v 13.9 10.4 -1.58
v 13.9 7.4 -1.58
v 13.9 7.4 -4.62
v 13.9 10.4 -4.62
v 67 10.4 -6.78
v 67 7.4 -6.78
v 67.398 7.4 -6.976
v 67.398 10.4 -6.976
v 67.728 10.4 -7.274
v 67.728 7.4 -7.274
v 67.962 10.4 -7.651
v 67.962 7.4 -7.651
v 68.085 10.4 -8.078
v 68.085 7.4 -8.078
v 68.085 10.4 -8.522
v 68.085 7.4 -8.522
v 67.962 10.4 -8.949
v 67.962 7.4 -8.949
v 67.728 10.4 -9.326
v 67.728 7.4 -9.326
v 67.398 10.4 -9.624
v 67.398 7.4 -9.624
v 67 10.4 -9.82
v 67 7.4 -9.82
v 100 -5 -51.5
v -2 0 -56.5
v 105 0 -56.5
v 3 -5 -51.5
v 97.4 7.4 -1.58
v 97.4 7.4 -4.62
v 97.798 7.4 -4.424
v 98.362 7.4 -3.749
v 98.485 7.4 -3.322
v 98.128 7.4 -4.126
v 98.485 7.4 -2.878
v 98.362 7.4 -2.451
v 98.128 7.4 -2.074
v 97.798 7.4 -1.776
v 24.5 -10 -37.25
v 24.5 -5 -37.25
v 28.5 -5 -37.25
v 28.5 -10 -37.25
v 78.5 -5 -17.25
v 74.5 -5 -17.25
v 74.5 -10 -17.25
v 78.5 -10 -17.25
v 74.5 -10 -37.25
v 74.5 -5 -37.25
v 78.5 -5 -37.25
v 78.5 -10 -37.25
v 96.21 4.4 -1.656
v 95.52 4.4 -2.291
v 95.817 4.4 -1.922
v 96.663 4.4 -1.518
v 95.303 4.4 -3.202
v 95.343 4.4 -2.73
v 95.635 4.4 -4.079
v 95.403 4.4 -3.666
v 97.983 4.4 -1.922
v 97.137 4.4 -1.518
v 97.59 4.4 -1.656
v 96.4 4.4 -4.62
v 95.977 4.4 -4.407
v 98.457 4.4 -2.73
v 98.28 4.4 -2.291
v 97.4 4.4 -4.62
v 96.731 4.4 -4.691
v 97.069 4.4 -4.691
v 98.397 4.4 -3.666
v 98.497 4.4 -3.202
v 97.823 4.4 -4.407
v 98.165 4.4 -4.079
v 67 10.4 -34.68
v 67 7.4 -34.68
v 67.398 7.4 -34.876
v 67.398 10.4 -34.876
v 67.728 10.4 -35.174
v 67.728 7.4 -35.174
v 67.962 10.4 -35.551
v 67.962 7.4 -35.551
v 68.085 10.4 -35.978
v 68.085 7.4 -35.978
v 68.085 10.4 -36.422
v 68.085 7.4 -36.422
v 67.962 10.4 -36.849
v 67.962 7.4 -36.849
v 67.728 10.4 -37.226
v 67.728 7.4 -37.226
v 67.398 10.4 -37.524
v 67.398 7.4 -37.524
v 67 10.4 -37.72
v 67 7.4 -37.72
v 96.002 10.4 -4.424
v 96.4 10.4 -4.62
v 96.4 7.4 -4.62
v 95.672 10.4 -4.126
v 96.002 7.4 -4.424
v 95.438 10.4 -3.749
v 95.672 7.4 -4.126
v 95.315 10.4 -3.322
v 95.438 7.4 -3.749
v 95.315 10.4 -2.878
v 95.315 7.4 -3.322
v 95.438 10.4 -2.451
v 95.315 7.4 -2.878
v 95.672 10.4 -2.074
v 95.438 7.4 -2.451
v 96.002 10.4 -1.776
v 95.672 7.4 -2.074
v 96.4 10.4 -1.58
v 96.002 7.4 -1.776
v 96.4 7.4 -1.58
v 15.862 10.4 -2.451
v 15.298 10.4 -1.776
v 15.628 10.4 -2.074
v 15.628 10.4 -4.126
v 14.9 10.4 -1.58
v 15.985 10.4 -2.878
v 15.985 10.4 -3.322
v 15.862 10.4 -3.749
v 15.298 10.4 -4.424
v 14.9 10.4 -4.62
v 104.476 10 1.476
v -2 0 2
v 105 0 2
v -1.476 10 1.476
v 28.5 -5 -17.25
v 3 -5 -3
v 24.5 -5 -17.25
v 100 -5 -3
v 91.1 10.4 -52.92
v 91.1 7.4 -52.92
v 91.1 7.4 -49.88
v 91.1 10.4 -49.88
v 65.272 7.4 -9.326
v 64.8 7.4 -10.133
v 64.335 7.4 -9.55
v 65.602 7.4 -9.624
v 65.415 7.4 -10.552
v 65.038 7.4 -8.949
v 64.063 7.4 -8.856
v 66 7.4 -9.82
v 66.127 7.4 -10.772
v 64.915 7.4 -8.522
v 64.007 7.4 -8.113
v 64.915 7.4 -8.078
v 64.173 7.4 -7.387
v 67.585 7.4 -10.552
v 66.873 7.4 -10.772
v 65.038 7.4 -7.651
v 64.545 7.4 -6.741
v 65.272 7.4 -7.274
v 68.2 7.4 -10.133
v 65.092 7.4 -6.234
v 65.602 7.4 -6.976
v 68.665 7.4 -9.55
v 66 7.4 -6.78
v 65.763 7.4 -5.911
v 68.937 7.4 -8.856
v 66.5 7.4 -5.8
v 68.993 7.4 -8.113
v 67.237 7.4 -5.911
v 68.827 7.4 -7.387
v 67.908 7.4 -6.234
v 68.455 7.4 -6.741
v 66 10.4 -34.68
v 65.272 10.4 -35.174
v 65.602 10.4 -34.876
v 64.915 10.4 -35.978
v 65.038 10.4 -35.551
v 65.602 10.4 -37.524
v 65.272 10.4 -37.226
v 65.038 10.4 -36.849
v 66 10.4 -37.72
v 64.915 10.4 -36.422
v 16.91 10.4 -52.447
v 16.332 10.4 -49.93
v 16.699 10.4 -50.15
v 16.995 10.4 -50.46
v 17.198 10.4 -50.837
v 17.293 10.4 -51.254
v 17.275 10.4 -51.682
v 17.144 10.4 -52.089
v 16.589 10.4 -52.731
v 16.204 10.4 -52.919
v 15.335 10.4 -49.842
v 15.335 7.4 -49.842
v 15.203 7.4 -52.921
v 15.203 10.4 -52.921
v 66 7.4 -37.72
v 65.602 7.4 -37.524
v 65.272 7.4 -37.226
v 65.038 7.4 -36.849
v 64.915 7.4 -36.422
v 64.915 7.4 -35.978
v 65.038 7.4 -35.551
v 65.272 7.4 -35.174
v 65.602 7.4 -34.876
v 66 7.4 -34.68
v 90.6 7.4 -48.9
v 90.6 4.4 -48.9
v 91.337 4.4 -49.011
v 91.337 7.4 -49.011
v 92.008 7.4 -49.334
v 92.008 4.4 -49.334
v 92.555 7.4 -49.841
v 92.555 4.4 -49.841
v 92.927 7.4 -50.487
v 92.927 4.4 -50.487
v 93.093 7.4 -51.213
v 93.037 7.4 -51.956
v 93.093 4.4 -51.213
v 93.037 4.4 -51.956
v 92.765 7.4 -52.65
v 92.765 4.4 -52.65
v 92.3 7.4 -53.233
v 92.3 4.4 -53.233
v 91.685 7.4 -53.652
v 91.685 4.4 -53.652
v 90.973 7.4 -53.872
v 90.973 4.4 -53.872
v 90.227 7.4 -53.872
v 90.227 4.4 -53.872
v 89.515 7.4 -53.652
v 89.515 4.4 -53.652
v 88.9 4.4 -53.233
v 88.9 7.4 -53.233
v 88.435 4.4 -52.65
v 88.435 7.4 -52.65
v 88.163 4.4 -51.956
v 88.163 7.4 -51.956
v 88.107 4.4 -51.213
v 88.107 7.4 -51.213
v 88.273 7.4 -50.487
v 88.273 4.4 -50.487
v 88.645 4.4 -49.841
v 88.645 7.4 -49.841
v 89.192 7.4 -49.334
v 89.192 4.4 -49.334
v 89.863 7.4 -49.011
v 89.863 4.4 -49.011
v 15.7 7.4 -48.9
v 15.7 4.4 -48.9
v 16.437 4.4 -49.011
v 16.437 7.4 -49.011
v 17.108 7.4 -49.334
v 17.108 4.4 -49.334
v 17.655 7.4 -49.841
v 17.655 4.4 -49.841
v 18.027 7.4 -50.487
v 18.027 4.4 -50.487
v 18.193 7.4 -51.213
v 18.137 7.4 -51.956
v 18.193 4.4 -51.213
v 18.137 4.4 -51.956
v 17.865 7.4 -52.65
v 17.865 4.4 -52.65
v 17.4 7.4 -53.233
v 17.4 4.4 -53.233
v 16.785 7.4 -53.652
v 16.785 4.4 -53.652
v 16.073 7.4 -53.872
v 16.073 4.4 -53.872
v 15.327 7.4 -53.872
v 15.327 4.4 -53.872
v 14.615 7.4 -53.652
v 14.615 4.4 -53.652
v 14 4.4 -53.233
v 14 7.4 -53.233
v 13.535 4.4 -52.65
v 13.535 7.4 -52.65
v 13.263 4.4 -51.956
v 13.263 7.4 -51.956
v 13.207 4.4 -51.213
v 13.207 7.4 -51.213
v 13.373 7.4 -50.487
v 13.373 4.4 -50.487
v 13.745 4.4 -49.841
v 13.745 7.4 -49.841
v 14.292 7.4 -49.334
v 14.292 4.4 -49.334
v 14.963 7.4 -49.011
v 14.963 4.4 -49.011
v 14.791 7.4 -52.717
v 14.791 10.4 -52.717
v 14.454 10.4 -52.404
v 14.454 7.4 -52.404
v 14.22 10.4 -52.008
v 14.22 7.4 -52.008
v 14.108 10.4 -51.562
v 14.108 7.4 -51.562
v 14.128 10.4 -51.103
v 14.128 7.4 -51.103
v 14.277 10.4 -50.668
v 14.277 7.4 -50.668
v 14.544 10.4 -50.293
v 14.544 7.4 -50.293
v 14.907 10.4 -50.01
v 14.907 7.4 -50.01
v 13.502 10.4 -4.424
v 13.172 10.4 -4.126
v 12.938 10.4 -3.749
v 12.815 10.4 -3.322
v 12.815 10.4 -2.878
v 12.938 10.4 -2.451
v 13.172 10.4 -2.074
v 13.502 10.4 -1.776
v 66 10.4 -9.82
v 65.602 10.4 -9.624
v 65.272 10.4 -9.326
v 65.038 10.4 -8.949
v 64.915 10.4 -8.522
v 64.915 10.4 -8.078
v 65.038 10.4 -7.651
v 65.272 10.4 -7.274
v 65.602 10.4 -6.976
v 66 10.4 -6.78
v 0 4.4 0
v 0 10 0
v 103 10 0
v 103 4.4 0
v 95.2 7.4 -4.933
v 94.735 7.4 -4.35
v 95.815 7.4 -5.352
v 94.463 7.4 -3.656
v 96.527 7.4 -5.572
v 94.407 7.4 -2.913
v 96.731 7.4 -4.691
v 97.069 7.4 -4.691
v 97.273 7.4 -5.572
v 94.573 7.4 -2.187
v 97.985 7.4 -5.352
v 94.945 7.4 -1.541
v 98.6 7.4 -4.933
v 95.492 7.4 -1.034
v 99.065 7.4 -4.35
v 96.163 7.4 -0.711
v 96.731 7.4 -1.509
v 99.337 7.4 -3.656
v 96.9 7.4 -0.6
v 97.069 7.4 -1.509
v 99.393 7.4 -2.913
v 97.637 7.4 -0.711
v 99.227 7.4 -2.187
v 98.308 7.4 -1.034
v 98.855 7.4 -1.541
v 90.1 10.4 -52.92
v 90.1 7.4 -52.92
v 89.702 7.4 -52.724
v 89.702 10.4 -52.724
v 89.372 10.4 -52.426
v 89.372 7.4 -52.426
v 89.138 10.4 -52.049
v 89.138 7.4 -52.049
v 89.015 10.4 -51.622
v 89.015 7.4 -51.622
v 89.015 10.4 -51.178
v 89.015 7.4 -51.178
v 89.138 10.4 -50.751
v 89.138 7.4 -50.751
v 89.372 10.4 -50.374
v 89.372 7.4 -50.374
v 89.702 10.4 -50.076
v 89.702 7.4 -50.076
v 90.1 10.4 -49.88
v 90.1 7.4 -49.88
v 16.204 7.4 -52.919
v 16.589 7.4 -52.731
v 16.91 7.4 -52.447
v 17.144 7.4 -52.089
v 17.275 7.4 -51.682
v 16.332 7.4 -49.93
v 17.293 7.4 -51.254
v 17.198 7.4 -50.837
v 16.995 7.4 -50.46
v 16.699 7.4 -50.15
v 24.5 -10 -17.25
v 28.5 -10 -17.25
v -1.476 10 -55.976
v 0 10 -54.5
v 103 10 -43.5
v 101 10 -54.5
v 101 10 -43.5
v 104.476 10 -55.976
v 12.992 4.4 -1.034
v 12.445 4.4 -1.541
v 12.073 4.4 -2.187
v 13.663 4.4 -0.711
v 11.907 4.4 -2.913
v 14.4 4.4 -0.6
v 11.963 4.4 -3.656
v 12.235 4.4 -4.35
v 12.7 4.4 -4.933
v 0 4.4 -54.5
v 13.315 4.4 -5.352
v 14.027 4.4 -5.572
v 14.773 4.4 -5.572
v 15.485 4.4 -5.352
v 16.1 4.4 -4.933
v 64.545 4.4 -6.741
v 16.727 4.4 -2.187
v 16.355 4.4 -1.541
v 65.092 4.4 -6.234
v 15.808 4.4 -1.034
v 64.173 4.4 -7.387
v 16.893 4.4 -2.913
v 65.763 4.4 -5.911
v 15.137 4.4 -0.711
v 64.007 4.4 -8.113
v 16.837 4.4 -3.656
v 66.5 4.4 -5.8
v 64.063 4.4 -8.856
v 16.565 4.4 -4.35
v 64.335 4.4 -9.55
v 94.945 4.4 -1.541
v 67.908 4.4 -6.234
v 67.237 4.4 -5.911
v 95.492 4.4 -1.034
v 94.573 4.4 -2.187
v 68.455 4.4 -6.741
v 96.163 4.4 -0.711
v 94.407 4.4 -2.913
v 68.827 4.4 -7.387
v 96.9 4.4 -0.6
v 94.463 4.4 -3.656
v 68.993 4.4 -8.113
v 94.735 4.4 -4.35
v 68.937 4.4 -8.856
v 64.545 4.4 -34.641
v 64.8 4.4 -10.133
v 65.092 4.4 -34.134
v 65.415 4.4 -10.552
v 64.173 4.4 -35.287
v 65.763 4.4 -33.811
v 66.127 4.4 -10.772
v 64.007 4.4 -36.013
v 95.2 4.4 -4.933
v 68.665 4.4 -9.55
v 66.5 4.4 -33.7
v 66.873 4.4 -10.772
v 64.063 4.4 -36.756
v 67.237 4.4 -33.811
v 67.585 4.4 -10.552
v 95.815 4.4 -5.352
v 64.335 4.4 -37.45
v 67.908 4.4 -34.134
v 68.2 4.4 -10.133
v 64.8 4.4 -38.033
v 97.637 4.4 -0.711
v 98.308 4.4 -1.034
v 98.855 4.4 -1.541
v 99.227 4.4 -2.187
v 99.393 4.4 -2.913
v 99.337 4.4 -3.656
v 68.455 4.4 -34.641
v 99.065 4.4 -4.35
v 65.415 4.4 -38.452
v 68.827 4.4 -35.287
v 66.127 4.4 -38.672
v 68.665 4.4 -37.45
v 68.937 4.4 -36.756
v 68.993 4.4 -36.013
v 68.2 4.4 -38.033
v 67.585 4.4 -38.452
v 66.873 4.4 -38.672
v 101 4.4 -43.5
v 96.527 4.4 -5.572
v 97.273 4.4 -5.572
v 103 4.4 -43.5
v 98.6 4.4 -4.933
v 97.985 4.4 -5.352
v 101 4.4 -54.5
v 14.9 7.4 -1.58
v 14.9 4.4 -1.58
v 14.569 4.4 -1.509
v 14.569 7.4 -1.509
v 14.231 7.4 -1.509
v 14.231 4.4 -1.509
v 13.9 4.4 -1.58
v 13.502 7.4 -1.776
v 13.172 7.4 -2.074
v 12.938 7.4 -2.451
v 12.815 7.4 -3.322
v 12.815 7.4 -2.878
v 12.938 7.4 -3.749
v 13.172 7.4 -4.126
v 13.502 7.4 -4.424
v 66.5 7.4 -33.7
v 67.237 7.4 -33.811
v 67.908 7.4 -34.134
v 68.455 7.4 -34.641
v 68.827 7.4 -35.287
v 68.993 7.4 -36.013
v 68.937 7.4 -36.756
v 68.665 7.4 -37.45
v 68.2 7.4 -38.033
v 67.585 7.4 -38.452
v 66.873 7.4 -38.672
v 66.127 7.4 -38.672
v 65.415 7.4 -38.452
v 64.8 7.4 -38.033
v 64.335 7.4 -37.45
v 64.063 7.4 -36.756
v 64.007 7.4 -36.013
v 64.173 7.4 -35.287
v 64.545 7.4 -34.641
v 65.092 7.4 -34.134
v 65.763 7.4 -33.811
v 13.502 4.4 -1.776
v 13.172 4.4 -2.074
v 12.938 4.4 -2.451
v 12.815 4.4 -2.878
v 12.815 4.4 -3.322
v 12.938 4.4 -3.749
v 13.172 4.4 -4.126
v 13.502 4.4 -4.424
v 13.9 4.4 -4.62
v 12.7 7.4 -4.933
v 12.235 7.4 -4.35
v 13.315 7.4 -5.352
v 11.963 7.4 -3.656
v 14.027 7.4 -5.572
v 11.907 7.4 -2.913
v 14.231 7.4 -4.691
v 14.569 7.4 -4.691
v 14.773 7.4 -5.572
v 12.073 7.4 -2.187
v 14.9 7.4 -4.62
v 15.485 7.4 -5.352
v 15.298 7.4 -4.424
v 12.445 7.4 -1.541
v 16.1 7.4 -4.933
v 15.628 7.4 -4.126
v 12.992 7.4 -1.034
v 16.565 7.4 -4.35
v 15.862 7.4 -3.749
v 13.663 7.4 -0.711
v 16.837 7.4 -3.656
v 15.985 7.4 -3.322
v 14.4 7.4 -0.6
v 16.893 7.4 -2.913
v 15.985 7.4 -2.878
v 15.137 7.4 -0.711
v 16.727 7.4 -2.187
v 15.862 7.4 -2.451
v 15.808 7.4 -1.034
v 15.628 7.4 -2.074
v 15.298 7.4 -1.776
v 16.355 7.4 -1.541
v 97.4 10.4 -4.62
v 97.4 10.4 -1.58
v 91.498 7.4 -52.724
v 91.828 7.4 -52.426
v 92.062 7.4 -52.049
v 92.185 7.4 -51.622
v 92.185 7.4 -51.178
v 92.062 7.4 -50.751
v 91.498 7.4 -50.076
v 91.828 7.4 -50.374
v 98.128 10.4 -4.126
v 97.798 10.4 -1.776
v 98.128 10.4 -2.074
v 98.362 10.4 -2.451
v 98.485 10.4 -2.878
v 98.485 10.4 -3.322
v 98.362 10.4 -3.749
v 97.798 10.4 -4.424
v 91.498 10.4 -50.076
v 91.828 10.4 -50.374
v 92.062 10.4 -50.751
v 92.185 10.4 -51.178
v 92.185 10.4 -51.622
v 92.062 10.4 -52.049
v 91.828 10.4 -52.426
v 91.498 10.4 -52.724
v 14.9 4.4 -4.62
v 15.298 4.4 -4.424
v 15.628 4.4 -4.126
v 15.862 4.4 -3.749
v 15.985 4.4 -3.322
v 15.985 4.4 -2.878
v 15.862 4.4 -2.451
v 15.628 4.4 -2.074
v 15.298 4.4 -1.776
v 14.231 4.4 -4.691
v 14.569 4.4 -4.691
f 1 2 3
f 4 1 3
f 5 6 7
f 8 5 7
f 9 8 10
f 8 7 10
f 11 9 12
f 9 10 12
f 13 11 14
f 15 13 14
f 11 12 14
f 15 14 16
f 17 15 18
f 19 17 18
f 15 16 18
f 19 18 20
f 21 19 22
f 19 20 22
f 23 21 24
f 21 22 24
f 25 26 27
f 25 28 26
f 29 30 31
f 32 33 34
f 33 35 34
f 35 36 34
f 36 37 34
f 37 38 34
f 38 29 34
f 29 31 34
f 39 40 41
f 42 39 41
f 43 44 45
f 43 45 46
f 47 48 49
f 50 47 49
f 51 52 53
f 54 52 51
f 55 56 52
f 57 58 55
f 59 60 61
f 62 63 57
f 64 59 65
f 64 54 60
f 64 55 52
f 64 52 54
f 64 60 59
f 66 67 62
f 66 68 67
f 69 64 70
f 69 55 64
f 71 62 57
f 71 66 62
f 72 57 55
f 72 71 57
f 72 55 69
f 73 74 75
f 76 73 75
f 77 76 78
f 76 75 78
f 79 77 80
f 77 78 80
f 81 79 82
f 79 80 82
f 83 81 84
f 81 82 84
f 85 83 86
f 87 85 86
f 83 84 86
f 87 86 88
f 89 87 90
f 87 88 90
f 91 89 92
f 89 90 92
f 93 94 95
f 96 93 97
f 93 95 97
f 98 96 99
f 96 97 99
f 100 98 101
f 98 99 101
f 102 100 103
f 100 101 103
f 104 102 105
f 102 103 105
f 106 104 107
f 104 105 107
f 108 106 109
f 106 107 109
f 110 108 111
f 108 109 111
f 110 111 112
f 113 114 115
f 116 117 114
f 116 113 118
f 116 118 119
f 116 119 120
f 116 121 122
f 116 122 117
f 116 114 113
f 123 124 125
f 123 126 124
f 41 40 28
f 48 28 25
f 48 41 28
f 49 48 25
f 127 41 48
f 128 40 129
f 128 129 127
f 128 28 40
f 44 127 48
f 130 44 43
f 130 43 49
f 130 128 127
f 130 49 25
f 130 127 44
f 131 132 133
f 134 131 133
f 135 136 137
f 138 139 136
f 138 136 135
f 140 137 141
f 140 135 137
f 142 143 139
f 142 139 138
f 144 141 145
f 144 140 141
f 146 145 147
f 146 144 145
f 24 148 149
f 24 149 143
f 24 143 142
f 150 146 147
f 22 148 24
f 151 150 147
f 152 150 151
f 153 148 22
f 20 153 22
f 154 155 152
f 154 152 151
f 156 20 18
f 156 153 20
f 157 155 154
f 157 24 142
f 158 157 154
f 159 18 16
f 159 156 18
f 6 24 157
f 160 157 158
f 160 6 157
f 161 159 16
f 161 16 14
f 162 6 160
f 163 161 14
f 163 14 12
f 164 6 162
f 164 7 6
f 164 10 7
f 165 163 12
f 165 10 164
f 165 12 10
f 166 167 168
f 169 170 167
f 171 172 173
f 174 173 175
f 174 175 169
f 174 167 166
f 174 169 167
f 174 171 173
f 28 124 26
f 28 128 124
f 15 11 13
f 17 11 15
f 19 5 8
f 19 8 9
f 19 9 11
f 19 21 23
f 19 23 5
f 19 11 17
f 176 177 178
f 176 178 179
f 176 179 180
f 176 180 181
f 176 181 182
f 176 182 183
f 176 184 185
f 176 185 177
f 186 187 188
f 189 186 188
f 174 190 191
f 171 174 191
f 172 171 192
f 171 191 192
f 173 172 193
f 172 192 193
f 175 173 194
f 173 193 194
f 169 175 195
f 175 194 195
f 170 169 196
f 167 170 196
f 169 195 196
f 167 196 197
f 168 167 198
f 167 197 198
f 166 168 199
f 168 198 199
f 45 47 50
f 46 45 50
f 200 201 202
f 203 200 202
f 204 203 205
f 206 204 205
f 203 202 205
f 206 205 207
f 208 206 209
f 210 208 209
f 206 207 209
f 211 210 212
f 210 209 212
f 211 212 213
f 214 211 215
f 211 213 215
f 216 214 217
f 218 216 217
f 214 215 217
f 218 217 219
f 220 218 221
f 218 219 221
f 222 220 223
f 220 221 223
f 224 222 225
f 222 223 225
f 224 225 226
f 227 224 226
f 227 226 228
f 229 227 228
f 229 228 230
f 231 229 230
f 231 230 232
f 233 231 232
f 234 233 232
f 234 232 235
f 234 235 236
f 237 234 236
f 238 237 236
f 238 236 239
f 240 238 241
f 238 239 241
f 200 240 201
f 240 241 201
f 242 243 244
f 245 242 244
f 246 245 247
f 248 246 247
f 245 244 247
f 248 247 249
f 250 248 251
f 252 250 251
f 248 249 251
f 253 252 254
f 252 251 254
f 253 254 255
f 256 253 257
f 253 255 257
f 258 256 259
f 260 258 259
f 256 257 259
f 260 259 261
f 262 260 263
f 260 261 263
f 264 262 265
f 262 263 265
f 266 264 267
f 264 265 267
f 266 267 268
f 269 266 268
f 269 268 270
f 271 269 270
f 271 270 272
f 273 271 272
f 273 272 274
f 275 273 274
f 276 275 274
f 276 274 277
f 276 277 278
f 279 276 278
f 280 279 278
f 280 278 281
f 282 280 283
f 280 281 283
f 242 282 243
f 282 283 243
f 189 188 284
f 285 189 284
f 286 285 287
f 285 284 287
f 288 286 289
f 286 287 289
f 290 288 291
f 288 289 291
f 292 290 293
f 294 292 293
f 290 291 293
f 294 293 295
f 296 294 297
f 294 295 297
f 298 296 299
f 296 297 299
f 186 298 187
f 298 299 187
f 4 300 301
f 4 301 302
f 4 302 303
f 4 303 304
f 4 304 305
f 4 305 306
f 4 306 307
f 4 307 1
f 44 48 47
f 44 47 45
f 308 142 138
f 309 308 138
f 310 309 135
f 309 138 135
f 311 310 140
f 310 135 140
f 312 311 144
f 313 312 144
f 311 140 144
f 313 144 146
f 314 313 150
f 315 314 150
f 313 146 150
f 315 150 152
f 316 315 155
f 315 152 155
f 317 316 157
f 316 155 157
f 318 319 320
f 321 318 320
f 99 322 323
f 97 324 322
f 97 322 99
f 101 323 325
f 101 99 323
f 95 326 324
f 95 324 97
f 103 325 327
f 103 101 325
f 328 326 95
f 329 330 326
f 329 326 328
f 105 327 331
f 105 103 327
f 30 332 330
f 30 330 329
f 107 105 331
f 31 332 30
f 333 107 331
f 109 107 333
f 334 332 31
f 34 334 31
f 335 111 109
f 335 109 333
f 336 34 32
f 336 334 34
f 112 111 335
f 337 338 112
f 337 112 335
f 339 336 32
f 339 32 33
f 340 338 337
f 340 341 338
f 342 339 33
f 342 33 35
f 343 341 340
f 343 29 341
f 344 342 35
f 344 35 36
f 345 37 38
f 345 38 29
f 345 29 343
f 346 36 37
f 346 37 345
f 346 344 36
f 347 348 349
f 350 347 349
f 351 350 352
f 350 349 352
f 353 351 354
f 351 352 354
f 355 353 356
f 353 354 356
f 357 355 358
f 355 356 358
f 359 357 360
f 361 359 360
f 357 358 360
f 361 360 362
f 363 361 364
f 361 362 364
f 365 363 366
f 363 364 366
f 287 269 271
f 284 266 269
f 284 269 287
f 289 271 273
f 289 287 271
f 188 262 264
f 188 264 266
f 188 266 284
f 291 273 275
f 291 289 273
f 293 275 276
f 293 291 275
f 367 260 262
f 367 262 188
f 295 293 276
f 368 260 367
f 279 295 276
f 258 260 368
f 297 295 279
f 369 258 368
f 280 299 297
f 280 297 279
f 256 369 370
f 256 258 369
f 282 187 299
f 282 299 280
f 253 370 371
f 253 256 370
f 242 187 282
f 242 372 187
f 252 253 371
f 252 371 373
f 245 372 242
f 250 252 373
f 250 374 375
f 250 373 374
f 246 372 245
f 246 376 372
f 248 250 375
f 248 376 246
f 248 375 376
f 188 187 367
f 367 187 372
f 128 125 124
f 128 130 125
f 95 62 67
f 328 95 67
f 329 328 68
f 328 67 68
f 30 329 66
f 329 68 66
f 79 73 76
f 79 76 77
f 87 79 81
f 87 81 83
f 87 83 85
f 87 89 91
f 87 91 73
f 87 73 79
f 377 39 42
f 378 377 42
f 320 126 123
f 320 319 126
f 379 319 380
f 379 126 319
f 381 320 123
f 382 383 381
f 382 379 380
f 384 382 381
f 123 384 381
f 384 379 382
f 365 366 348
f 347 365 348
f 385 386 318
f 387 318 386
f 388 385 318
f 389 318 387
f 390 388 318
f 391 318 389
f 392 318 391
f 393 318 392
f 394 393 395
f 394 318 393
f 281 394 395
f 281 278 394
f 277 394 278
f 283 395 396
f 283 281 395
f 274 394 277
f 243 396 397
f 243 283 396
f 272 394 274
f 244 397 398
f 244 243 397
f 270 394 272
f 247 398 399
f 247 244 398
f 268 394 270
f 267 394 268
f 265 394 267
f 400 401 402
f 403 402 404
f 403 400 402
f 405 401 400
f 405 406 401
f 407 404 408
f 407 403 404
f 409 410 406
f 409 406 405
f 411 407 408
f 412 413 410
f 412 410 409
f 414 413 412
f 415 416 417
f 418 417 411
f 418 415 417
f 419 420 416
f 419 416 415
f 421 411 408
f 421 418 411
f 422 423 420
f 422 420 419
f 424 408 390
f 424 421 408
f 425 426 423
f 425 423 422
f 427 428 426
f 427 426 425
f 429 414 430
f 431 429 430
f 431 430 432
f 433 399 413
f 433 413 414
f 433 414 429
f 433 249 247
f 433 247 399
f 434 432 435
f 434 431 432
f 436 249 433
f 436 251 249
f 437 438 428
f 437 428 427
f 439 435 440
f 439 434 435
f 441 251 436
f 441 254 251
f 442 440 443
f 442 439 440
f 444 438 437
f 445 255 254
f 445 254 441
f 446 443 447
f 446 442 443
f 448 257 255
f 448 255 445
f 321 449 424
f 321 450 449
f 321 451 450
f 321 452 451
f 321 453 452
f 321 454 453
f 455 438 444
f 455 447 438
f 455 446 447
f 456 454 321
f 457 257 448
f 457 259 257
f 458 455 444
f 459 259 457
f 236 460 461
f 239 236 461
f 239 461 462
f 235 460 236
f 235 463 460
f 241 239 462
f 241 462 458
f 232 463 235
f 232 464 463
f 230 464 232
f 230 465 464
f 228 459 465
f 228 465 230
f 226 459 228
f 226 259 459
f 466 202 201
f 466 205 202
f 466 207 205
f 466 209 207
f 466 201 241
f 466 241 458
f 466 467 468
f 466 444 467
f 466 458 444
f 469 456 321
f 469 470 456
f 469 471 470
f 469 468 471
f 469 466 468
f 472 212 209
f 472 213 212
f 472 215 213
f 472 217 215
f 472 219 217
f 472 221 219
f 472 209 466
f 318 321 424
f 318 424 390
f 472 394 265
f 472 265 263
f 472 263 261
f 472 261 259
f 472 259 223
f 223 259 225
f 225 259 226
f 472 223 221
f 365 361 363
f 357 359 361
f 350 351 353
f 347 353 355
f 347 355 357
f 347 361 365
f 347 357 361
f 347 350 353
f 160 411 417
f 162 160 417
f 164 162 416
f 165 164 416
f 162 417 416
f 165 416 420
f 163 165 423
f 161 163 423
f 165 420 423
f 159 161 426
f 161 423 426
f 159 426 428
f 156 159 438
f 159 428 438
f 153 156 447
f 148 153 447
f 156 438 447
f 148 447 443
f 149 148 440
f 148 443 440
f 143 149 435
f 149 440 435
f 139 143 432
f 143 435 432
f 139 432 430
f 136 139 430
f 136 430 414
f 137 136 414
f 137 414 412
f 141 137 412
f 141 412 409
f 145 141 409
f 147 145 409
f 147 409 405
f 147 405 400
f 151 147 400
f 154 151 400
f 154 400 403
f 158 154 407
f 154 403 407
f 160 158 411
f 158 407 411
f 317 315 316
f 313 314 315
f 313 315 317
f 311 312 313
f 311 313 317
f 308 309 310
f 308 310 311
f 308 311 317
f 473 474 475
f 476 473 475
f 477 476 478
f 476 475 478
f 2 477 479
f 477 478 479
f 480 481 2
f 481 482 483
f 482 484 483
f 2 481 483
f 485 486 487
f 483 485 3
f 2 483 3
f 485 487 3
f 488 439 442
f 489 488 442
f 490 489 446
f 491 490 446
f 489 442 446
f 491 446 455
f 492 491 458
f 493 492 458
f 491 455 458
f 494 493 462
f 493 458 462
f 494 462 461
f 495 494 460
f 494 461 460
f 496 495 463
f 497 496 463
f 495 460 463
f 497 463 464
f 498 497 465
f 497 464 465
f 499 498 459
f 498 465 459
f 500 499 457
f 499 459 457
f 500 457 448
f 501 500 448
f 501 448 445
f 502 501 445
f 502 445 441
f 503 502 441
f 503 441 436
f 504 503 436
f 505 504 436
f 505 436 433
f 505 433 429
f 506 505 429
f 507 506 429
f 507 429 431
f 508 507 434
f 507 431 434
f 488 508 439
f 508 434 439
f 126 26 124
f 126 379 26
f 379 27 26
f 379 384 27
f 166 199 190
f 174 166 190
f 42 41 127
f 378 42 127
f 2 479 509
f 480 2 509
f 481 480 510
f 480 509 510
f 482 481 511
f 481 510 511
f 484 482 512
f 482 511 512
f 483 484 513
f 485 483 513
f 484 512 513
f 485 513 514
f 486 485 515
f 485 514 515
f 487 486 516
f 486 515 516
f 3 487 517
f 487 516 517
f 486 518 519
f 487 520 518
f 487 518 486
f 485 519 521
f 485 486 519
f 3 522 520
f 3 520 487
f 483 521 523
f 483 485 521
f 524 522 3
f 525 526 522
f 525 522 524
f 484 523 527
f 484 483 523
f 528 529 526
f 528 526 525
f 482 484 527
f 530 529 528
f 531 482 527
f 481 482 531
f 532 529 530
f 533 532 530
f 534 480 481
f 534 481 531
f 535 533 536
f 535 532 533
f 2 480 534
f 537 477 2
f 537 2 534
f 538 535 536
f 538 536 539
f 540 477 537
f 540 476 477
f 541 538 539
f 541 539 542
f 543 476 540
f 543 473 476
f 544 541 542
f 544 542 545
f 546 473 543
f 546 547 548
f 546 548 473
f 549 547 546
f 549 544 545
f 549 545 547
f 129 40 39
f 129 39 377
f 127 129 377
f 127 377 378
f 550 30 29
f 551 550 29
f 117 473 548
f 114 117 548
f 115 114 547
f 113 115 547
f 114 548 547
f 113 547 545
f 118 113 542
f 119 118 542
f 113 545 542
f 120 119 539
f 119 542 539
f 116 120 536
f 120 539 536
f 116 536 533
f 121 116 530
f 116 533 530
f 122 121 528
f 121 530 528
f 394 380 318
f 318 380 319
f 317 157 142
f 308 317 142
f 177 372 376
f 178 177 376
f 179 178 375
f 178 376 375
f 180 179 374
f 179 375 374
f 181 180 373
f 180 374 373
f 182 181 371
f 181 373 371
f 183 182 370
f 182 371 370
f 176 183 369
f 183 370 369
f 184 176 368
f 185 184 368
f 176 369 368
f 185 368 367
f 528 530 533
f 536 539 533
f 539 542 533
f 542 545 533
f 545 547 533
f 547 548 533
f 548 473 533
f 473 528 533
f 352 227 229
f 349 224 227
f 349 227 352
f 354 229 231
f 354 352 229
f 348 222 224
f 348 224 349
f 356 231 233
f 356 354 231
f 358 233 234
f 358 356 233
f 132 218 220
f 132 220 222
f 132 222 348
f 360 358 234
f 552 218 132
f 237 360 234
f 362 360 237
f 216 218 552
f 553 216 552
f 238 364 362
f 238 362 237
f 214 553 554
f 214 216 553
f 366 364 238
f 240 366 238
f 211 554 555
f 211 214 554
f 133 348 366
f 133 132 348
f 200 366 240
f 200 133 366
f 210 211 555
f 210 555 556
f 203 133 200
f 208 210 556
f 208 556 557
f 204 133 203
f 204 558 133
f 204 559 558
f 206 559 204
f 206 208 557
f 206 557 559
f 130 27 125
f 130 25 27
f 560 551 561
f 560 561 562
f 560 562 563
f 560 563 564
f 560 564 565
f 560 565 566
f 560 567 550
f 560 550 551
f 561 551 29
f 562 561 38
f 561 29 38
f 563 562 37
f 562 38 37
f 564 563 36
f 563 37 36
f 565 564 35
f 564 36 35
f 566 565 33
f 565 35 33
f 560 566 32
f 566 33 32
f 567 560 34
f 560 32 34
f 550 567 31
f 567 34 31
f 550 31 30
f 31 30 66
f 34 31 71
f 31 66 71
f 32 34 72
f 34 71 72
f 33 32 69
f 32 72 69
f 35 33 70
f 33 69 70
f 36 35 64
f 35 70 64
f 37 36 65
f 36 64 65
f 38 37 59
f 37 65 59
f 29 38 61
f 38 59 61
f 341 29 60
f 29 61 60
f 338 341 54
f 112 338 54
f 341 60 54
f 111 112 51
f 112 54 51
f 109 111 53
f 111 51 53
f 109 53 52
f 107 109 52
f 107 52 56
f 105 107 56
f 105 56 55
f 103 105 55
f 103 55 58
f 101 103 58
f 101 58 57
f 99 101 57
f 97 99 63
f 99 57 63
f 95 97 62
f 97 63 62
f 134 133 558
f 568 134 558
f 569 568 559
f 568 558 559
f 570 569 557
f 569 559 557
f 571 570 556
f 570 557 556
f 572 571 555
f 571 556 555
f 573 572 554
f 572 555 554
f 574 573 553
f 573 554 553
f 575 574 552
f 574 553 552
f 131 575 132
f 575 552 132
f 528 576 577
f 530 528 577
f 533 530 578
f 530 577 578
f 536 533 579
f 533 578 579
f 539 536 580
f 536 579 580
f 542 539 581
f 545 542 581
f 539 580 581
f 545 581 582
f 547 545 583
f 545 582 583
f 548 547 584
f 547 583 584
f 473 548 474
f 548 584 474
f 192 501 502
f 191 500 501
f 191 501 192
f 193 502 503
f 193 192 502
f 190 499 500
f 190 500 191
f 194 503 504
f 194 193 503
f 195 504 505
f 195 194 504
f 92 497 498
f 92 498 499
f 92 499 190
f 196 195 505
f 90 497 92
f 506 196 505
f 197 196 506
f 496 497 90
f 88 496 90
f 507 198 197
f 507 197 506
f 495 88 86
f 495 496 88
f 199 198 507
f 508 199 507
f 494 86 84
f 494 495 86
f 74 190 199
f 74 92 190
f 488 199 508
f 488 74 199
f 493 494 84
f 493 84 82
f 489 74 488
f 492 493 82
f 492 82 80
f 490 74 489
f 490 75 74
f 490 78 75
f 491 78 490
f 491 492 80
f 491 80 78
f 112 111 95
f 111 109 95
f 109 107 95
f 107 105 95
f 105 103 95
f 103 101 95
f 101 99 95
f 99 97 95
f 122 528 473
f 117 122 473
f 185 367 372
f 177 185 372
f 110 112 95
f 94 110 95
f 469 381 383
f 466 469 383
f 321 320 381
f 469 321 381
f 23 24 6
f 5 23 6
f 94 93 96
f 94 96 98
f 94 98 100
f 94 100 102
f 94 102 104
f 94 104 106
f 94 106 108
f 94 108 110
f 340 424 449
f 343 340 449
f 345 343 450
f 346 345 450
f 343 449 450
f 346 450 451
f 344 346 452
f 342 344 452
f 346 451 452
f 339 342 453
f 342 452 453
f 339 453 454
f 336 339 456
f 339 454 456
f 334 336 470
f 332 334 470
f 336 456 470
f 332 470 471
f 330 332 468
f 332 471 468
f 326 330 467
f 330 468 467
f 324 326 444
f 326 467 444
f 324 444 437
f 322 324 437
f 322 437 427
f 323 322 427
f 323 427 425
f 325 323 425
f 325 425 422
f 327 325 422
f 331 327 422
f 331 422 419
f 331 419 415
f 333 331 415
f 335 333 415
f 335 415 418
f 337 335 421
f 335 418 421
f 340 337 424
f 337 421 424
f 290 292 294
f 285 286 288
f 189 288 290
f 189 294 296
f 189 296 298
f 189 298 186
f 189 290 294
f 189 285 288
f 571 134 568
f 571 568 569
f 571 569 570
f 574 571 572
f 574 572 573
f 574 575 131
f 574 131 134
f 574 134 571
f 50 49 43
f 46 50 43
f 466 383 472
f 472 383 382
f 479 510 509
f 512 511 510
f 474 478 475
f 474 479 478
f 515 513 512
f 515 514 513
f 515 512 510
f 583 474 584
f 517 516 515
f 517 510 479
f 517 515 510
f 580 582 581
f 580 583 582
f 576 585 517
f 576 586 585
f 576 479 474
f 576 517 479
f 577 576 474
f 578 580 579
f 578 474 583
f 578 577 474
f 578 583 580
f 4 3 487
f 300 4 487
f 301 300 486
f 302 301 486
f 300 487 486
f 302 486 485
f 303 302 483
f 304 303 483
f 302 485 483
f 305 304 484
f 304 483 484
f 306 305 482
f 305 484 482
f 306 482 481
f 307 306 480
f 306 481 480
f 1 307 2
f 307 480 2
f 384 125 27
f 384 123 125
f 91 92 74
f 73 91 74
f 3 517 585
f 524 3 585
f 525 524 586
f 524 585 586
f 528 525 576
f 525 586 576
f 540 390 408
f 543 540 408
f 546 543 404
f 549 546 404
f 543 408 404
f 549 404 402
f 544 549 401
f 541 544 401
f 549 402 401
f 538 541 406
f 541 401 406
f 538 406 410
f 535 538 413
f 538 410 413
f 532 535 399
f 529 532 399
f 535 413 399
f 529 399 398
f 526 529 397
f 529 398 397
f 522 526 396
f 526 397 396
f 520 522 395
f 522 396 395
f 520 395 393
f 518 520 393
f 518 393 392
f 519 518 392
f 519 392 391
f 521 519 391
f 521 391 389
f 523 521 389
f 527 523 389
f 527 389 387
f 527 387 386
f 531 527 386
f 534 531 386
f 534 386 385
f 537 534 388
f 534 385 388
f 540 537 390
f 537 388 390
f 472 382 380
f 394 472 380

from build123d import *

# Parameters (mm, degrees)
SKETCH2_W           = 107
SKETCH2_H           = 58.5
BOSS_EXTRUDE1_DEPTH = 10
BOSS_EXTRUDE1_TAPER = 3
CUT_EXTRUDE1_START  = 10
SKETCH2_5_W         = 2
SKETCH2_5_H         = 1
CUT_EXTRUDE1_DEPTH  = 5.6
SKETCH8_W           = 107
SKETCH8_H           = 58.5
BOSS_EXTRUDE2_DEPTH = 5
BOSS_EXTRUDE2_TAPER = 45
SKETCH9_W           = 4
SKETCH9_H           = 20
BOSS_EXTRUDE3_DEPTH = 5
SKETCH10_R          = 2.5
BOSS_EXTRUDE4_DEPTH = 3
BOSS_EXTRUDE5_START = 7.4
BOSS_EXTRUDE5_DEPTH = 3


# Read off the part's stored shape, not the designer's step: Boss-Extrude5
with BuildPart() as part:
    # Sketch2 → Boss-Extrude1 (new body)
    with BuildSketch(Plane(origin=(0, 0, 0), x_dir=(1, 0, 0), z_dir=(0, 1, 0))):
        with Locations((51.5, 27.25)):
            Rectangle(SKETCH2_W, SKETCH2_H)
    extrude(amount=BOSS_EXTRUDE1_DEPTH, taper=BOSS_EXTRUDE1_TAPER)

    # Sketch2<5> → Cut-Extrude1 (cut)
    with BuildSketch(Plane(origin=(0, 0, 0), x_dir=(1, 0, 0), z_dir=(0, 1, 0)).offset(CUT_EXTRUDE1_START)):
        Polygon((0, 0), (101, 0), (101, 1), (103, 3), (103, 41.5), (101, 43.5), (101, 54.5), (0, 54.5), align=None)
        Polygon((103, 43.5), (101, 43.5), (103, 41.5), align=None)
        Polygon((103, 3), (101, 1), (103, 1), align=None)
        with Locations((102, 0.5)):
            Rectangle(SKETCH2_5_W, SKETCH2_5_H)
    extrude(amount=-CUT_EXTRUDE1_DEPTH, mode=Mode.SUBTRACT)

    # Sketch8 → Boss-Extrude2 (add)
    with BuildSketch(Plane.XZ):
        with Locations((51.5, -27.25)):
            Rectangle(SKETCH8_W, SKETCH8_H)
    extrude(amount=BOSS_EXTRUDE2_DEPTH, taper=BOSS_EXTRUDE2_TAPER)

    # Sketch9 → Boss-Extrude3 (add)
    with BuildSketch(Plane.XZ.offset(5)):
        with Locations((26.5, -27.25)):
            Rectangle(SKETCH9_W, SKETCH9_H)
        with Locations((76.5, -27.25)):
            Rectangle(SKETCH9_W, SKETCH9_H)
    extrude(amount=BOSS_EXTRUDE3_DEPTH)

    # Sketch10 → Boss-Extrude4 (add)
    # profile 1 of 6: a face of its own
    with BuildSketch(Plane(origin=(0, 4.4, 0), x_dir=(1, 0, 0), z_dir=(0, 1, 0))):
        with Locations(Location((15.7, 51.4, 0), (0, 0, 270))):
            Circle(SKETCH10_R)
    # profile 2 of 6: a face of its own
    with BuildSketch(Plane(origin=(0, 4.4, 0), x_dir=(1, 0, 0), z_dir=(0, 1, 0))):
        with Locations(Location((90.6, 51.4, 0), (0, 0, 270))):
            Circle(SKETCH10_R)
    # profile 3 of 6: a face of its own
    with BuildSketch(Plane(origin=(0, 4.4, 0), x_dir=(1, 0, 0), z_dir=(0, 1, 0))):
        with Locations(Location((66.5, 8.3, 0), (0, 0, 270))):
            Circle(SKETCH10_R)
    # profile 4 of 6: a face of its own
    with BuildSketch(Plane(origin=(0, 4.4, 0), x_dir=(1, 0, 0), z_dir=(0, 1, 0))):
        with Locations(Location((66.5, 36.2, 0), (0, 0, 270))):
            Circle(SKETCH10_R)
    # profile 5 of 6: a face of its own
    with BuildSketch(Plane(origin=(0, 4.4, 0), x_dir=(1, 0, 0), z_dir=(0, 1, 0))):
        with Locations(Location((96.9, 3.1, 0), (0, 0, 270))):
            Circle(SKETCH10_R)
        with BuildLine():
            ThreePointArc((96.4, 4.619868415), (96.9, 4.7), (97.4, 4.619868415))
            ThreePointArc((97.4, 4.619868415), (96.9, 1.5), (96.4, 4.619868415))
        make_face(mode=Mode.SUBTRACT)
    # profile 6 of 6: a face of its own
    with BuildSketch(Plane(origin=(0, 4.4, 0), x_dir=(1, 0, 0), z_dir=(0, 1, 0))):
        with Locations(Location((14.4, 3.1, 0), (0, 0, 270))):
            Circle(SKETCH10_R)
        with BuildLine():
            ThreePointArc((13.9, 1.580131585), (12.8, 3.1), (13.9, 4.619868415))
            ThreePointArc((13.9, 4.619868415), (14.4, 4.7), (14.9, 4.619868415))
            ThreePointArc((14.9, 4.619868415), (16, 3.1), (14.9, 1.580131585))
            ThreePointArc((14.9, 1.580131585), (14.4, 1.5), (13.9, 1.580131585))
        make_face(mode=Mode.SUBTRACT)
    extrude(amount=BOSS_EXTRUDE4_DEPTH)

    # Boss-Extrude5 outline → Boss-Extrude5 (add)
    with BuildSketch(Plane(origin=(0, 0, 0), x_dir=(1, 0, 0), z_dir=(0, 1, 0)).offset(BOSS_EXTRUDE5_START)):
        with BuildLine():
            ThreePointArc((96.4, 4.619868415), (95.3, 3.1), (96.4, 1.580131585))
            Line((96.4, 1.580131585), (96.4, 4.619868415))
        make_face()
        with BuildLine():
            ThreePointArc((97.4, 1.580131585), (98.5, 3.1), (97.4, 4.619868415))
            Line((97.4, 4.619868415), (97.4, 1.580131585))
        make_face()
        with BuildLine():
            ThreePointArc((13.9, 4.619868415), (12.8, 3.1), (13.9, 1.580131585))
            Line((13.9, 1.580131585), (13.9, 4.619868415))
        make_face()
        with BuildLine():
            ThreePointArc((14.9, 1.580131585), (16, 3.1), (14.9, 4.619868415))
            Line((14.9, 4.619868415), (14.9, 1.580131585))
        make_face()
        with BuildLine():
            ThreePointArc((16.332025214, 49.930121049), (17.298532633, 51.468508541), (16.203949106, 52.918563564))
            Line((16.203949106, 52.918563564), (16.332025214, 49.930121049))
        make_face()
        with BuildLine():
            ThreePointArc((15.202934006, 52.920830496), (14.101467367, 51.331491459), (15.334874522, 49.842218441))
            Line((15.334874522, 49.842218441), (15.202934006, 52.920830496))
        make_face()
        with BuildLine():
            ThreePointArc((91.1, 49.880131585), (92.2, 51.4), (91.1, 52.919868415))
            Line((91.1, 52.919868415), (91.1, 49.880131585))
        make_face()
        with BuildLine():
            ThreePointArc((90.1, 52.919868415), (89, 51.4), (90.1, 49.880131585))
            Line((90.1, 49.880131585), (90.1, 52.919868415))
        make_face()
        with BuildLine():
            ThreePointArc((67, 34.680131585), (68.1, 36.2), (67, 37.719868415))
            Line((67, 37.719868415), (67, 34.680131585))
        make_face()
        with BuildLine():
            ThreePointArc((66, 37.719868415), (64.9, 36.2), (66, 34.680131585))
            Line((66, 34.680131585), (66, 37.719868415))
        make_face()
        with BuildLine():
            ThreePointArc((67, 6.780131585), (68.1, 8.3), (67, 9.819868415))
            Line((67, 9.819868415), (67, 6.780131585))
        make_face()
        with BuildLine():
            Line((66, 6.780131585), (66, 9.819868415))
            ThreePointArc((66, 9.819868415), (64.9, 8.3), (66, 6.780131585))
        make_face()
    extrude(amount=BOSS_EXTRUDE5_DEPTH)


solid = part.part
